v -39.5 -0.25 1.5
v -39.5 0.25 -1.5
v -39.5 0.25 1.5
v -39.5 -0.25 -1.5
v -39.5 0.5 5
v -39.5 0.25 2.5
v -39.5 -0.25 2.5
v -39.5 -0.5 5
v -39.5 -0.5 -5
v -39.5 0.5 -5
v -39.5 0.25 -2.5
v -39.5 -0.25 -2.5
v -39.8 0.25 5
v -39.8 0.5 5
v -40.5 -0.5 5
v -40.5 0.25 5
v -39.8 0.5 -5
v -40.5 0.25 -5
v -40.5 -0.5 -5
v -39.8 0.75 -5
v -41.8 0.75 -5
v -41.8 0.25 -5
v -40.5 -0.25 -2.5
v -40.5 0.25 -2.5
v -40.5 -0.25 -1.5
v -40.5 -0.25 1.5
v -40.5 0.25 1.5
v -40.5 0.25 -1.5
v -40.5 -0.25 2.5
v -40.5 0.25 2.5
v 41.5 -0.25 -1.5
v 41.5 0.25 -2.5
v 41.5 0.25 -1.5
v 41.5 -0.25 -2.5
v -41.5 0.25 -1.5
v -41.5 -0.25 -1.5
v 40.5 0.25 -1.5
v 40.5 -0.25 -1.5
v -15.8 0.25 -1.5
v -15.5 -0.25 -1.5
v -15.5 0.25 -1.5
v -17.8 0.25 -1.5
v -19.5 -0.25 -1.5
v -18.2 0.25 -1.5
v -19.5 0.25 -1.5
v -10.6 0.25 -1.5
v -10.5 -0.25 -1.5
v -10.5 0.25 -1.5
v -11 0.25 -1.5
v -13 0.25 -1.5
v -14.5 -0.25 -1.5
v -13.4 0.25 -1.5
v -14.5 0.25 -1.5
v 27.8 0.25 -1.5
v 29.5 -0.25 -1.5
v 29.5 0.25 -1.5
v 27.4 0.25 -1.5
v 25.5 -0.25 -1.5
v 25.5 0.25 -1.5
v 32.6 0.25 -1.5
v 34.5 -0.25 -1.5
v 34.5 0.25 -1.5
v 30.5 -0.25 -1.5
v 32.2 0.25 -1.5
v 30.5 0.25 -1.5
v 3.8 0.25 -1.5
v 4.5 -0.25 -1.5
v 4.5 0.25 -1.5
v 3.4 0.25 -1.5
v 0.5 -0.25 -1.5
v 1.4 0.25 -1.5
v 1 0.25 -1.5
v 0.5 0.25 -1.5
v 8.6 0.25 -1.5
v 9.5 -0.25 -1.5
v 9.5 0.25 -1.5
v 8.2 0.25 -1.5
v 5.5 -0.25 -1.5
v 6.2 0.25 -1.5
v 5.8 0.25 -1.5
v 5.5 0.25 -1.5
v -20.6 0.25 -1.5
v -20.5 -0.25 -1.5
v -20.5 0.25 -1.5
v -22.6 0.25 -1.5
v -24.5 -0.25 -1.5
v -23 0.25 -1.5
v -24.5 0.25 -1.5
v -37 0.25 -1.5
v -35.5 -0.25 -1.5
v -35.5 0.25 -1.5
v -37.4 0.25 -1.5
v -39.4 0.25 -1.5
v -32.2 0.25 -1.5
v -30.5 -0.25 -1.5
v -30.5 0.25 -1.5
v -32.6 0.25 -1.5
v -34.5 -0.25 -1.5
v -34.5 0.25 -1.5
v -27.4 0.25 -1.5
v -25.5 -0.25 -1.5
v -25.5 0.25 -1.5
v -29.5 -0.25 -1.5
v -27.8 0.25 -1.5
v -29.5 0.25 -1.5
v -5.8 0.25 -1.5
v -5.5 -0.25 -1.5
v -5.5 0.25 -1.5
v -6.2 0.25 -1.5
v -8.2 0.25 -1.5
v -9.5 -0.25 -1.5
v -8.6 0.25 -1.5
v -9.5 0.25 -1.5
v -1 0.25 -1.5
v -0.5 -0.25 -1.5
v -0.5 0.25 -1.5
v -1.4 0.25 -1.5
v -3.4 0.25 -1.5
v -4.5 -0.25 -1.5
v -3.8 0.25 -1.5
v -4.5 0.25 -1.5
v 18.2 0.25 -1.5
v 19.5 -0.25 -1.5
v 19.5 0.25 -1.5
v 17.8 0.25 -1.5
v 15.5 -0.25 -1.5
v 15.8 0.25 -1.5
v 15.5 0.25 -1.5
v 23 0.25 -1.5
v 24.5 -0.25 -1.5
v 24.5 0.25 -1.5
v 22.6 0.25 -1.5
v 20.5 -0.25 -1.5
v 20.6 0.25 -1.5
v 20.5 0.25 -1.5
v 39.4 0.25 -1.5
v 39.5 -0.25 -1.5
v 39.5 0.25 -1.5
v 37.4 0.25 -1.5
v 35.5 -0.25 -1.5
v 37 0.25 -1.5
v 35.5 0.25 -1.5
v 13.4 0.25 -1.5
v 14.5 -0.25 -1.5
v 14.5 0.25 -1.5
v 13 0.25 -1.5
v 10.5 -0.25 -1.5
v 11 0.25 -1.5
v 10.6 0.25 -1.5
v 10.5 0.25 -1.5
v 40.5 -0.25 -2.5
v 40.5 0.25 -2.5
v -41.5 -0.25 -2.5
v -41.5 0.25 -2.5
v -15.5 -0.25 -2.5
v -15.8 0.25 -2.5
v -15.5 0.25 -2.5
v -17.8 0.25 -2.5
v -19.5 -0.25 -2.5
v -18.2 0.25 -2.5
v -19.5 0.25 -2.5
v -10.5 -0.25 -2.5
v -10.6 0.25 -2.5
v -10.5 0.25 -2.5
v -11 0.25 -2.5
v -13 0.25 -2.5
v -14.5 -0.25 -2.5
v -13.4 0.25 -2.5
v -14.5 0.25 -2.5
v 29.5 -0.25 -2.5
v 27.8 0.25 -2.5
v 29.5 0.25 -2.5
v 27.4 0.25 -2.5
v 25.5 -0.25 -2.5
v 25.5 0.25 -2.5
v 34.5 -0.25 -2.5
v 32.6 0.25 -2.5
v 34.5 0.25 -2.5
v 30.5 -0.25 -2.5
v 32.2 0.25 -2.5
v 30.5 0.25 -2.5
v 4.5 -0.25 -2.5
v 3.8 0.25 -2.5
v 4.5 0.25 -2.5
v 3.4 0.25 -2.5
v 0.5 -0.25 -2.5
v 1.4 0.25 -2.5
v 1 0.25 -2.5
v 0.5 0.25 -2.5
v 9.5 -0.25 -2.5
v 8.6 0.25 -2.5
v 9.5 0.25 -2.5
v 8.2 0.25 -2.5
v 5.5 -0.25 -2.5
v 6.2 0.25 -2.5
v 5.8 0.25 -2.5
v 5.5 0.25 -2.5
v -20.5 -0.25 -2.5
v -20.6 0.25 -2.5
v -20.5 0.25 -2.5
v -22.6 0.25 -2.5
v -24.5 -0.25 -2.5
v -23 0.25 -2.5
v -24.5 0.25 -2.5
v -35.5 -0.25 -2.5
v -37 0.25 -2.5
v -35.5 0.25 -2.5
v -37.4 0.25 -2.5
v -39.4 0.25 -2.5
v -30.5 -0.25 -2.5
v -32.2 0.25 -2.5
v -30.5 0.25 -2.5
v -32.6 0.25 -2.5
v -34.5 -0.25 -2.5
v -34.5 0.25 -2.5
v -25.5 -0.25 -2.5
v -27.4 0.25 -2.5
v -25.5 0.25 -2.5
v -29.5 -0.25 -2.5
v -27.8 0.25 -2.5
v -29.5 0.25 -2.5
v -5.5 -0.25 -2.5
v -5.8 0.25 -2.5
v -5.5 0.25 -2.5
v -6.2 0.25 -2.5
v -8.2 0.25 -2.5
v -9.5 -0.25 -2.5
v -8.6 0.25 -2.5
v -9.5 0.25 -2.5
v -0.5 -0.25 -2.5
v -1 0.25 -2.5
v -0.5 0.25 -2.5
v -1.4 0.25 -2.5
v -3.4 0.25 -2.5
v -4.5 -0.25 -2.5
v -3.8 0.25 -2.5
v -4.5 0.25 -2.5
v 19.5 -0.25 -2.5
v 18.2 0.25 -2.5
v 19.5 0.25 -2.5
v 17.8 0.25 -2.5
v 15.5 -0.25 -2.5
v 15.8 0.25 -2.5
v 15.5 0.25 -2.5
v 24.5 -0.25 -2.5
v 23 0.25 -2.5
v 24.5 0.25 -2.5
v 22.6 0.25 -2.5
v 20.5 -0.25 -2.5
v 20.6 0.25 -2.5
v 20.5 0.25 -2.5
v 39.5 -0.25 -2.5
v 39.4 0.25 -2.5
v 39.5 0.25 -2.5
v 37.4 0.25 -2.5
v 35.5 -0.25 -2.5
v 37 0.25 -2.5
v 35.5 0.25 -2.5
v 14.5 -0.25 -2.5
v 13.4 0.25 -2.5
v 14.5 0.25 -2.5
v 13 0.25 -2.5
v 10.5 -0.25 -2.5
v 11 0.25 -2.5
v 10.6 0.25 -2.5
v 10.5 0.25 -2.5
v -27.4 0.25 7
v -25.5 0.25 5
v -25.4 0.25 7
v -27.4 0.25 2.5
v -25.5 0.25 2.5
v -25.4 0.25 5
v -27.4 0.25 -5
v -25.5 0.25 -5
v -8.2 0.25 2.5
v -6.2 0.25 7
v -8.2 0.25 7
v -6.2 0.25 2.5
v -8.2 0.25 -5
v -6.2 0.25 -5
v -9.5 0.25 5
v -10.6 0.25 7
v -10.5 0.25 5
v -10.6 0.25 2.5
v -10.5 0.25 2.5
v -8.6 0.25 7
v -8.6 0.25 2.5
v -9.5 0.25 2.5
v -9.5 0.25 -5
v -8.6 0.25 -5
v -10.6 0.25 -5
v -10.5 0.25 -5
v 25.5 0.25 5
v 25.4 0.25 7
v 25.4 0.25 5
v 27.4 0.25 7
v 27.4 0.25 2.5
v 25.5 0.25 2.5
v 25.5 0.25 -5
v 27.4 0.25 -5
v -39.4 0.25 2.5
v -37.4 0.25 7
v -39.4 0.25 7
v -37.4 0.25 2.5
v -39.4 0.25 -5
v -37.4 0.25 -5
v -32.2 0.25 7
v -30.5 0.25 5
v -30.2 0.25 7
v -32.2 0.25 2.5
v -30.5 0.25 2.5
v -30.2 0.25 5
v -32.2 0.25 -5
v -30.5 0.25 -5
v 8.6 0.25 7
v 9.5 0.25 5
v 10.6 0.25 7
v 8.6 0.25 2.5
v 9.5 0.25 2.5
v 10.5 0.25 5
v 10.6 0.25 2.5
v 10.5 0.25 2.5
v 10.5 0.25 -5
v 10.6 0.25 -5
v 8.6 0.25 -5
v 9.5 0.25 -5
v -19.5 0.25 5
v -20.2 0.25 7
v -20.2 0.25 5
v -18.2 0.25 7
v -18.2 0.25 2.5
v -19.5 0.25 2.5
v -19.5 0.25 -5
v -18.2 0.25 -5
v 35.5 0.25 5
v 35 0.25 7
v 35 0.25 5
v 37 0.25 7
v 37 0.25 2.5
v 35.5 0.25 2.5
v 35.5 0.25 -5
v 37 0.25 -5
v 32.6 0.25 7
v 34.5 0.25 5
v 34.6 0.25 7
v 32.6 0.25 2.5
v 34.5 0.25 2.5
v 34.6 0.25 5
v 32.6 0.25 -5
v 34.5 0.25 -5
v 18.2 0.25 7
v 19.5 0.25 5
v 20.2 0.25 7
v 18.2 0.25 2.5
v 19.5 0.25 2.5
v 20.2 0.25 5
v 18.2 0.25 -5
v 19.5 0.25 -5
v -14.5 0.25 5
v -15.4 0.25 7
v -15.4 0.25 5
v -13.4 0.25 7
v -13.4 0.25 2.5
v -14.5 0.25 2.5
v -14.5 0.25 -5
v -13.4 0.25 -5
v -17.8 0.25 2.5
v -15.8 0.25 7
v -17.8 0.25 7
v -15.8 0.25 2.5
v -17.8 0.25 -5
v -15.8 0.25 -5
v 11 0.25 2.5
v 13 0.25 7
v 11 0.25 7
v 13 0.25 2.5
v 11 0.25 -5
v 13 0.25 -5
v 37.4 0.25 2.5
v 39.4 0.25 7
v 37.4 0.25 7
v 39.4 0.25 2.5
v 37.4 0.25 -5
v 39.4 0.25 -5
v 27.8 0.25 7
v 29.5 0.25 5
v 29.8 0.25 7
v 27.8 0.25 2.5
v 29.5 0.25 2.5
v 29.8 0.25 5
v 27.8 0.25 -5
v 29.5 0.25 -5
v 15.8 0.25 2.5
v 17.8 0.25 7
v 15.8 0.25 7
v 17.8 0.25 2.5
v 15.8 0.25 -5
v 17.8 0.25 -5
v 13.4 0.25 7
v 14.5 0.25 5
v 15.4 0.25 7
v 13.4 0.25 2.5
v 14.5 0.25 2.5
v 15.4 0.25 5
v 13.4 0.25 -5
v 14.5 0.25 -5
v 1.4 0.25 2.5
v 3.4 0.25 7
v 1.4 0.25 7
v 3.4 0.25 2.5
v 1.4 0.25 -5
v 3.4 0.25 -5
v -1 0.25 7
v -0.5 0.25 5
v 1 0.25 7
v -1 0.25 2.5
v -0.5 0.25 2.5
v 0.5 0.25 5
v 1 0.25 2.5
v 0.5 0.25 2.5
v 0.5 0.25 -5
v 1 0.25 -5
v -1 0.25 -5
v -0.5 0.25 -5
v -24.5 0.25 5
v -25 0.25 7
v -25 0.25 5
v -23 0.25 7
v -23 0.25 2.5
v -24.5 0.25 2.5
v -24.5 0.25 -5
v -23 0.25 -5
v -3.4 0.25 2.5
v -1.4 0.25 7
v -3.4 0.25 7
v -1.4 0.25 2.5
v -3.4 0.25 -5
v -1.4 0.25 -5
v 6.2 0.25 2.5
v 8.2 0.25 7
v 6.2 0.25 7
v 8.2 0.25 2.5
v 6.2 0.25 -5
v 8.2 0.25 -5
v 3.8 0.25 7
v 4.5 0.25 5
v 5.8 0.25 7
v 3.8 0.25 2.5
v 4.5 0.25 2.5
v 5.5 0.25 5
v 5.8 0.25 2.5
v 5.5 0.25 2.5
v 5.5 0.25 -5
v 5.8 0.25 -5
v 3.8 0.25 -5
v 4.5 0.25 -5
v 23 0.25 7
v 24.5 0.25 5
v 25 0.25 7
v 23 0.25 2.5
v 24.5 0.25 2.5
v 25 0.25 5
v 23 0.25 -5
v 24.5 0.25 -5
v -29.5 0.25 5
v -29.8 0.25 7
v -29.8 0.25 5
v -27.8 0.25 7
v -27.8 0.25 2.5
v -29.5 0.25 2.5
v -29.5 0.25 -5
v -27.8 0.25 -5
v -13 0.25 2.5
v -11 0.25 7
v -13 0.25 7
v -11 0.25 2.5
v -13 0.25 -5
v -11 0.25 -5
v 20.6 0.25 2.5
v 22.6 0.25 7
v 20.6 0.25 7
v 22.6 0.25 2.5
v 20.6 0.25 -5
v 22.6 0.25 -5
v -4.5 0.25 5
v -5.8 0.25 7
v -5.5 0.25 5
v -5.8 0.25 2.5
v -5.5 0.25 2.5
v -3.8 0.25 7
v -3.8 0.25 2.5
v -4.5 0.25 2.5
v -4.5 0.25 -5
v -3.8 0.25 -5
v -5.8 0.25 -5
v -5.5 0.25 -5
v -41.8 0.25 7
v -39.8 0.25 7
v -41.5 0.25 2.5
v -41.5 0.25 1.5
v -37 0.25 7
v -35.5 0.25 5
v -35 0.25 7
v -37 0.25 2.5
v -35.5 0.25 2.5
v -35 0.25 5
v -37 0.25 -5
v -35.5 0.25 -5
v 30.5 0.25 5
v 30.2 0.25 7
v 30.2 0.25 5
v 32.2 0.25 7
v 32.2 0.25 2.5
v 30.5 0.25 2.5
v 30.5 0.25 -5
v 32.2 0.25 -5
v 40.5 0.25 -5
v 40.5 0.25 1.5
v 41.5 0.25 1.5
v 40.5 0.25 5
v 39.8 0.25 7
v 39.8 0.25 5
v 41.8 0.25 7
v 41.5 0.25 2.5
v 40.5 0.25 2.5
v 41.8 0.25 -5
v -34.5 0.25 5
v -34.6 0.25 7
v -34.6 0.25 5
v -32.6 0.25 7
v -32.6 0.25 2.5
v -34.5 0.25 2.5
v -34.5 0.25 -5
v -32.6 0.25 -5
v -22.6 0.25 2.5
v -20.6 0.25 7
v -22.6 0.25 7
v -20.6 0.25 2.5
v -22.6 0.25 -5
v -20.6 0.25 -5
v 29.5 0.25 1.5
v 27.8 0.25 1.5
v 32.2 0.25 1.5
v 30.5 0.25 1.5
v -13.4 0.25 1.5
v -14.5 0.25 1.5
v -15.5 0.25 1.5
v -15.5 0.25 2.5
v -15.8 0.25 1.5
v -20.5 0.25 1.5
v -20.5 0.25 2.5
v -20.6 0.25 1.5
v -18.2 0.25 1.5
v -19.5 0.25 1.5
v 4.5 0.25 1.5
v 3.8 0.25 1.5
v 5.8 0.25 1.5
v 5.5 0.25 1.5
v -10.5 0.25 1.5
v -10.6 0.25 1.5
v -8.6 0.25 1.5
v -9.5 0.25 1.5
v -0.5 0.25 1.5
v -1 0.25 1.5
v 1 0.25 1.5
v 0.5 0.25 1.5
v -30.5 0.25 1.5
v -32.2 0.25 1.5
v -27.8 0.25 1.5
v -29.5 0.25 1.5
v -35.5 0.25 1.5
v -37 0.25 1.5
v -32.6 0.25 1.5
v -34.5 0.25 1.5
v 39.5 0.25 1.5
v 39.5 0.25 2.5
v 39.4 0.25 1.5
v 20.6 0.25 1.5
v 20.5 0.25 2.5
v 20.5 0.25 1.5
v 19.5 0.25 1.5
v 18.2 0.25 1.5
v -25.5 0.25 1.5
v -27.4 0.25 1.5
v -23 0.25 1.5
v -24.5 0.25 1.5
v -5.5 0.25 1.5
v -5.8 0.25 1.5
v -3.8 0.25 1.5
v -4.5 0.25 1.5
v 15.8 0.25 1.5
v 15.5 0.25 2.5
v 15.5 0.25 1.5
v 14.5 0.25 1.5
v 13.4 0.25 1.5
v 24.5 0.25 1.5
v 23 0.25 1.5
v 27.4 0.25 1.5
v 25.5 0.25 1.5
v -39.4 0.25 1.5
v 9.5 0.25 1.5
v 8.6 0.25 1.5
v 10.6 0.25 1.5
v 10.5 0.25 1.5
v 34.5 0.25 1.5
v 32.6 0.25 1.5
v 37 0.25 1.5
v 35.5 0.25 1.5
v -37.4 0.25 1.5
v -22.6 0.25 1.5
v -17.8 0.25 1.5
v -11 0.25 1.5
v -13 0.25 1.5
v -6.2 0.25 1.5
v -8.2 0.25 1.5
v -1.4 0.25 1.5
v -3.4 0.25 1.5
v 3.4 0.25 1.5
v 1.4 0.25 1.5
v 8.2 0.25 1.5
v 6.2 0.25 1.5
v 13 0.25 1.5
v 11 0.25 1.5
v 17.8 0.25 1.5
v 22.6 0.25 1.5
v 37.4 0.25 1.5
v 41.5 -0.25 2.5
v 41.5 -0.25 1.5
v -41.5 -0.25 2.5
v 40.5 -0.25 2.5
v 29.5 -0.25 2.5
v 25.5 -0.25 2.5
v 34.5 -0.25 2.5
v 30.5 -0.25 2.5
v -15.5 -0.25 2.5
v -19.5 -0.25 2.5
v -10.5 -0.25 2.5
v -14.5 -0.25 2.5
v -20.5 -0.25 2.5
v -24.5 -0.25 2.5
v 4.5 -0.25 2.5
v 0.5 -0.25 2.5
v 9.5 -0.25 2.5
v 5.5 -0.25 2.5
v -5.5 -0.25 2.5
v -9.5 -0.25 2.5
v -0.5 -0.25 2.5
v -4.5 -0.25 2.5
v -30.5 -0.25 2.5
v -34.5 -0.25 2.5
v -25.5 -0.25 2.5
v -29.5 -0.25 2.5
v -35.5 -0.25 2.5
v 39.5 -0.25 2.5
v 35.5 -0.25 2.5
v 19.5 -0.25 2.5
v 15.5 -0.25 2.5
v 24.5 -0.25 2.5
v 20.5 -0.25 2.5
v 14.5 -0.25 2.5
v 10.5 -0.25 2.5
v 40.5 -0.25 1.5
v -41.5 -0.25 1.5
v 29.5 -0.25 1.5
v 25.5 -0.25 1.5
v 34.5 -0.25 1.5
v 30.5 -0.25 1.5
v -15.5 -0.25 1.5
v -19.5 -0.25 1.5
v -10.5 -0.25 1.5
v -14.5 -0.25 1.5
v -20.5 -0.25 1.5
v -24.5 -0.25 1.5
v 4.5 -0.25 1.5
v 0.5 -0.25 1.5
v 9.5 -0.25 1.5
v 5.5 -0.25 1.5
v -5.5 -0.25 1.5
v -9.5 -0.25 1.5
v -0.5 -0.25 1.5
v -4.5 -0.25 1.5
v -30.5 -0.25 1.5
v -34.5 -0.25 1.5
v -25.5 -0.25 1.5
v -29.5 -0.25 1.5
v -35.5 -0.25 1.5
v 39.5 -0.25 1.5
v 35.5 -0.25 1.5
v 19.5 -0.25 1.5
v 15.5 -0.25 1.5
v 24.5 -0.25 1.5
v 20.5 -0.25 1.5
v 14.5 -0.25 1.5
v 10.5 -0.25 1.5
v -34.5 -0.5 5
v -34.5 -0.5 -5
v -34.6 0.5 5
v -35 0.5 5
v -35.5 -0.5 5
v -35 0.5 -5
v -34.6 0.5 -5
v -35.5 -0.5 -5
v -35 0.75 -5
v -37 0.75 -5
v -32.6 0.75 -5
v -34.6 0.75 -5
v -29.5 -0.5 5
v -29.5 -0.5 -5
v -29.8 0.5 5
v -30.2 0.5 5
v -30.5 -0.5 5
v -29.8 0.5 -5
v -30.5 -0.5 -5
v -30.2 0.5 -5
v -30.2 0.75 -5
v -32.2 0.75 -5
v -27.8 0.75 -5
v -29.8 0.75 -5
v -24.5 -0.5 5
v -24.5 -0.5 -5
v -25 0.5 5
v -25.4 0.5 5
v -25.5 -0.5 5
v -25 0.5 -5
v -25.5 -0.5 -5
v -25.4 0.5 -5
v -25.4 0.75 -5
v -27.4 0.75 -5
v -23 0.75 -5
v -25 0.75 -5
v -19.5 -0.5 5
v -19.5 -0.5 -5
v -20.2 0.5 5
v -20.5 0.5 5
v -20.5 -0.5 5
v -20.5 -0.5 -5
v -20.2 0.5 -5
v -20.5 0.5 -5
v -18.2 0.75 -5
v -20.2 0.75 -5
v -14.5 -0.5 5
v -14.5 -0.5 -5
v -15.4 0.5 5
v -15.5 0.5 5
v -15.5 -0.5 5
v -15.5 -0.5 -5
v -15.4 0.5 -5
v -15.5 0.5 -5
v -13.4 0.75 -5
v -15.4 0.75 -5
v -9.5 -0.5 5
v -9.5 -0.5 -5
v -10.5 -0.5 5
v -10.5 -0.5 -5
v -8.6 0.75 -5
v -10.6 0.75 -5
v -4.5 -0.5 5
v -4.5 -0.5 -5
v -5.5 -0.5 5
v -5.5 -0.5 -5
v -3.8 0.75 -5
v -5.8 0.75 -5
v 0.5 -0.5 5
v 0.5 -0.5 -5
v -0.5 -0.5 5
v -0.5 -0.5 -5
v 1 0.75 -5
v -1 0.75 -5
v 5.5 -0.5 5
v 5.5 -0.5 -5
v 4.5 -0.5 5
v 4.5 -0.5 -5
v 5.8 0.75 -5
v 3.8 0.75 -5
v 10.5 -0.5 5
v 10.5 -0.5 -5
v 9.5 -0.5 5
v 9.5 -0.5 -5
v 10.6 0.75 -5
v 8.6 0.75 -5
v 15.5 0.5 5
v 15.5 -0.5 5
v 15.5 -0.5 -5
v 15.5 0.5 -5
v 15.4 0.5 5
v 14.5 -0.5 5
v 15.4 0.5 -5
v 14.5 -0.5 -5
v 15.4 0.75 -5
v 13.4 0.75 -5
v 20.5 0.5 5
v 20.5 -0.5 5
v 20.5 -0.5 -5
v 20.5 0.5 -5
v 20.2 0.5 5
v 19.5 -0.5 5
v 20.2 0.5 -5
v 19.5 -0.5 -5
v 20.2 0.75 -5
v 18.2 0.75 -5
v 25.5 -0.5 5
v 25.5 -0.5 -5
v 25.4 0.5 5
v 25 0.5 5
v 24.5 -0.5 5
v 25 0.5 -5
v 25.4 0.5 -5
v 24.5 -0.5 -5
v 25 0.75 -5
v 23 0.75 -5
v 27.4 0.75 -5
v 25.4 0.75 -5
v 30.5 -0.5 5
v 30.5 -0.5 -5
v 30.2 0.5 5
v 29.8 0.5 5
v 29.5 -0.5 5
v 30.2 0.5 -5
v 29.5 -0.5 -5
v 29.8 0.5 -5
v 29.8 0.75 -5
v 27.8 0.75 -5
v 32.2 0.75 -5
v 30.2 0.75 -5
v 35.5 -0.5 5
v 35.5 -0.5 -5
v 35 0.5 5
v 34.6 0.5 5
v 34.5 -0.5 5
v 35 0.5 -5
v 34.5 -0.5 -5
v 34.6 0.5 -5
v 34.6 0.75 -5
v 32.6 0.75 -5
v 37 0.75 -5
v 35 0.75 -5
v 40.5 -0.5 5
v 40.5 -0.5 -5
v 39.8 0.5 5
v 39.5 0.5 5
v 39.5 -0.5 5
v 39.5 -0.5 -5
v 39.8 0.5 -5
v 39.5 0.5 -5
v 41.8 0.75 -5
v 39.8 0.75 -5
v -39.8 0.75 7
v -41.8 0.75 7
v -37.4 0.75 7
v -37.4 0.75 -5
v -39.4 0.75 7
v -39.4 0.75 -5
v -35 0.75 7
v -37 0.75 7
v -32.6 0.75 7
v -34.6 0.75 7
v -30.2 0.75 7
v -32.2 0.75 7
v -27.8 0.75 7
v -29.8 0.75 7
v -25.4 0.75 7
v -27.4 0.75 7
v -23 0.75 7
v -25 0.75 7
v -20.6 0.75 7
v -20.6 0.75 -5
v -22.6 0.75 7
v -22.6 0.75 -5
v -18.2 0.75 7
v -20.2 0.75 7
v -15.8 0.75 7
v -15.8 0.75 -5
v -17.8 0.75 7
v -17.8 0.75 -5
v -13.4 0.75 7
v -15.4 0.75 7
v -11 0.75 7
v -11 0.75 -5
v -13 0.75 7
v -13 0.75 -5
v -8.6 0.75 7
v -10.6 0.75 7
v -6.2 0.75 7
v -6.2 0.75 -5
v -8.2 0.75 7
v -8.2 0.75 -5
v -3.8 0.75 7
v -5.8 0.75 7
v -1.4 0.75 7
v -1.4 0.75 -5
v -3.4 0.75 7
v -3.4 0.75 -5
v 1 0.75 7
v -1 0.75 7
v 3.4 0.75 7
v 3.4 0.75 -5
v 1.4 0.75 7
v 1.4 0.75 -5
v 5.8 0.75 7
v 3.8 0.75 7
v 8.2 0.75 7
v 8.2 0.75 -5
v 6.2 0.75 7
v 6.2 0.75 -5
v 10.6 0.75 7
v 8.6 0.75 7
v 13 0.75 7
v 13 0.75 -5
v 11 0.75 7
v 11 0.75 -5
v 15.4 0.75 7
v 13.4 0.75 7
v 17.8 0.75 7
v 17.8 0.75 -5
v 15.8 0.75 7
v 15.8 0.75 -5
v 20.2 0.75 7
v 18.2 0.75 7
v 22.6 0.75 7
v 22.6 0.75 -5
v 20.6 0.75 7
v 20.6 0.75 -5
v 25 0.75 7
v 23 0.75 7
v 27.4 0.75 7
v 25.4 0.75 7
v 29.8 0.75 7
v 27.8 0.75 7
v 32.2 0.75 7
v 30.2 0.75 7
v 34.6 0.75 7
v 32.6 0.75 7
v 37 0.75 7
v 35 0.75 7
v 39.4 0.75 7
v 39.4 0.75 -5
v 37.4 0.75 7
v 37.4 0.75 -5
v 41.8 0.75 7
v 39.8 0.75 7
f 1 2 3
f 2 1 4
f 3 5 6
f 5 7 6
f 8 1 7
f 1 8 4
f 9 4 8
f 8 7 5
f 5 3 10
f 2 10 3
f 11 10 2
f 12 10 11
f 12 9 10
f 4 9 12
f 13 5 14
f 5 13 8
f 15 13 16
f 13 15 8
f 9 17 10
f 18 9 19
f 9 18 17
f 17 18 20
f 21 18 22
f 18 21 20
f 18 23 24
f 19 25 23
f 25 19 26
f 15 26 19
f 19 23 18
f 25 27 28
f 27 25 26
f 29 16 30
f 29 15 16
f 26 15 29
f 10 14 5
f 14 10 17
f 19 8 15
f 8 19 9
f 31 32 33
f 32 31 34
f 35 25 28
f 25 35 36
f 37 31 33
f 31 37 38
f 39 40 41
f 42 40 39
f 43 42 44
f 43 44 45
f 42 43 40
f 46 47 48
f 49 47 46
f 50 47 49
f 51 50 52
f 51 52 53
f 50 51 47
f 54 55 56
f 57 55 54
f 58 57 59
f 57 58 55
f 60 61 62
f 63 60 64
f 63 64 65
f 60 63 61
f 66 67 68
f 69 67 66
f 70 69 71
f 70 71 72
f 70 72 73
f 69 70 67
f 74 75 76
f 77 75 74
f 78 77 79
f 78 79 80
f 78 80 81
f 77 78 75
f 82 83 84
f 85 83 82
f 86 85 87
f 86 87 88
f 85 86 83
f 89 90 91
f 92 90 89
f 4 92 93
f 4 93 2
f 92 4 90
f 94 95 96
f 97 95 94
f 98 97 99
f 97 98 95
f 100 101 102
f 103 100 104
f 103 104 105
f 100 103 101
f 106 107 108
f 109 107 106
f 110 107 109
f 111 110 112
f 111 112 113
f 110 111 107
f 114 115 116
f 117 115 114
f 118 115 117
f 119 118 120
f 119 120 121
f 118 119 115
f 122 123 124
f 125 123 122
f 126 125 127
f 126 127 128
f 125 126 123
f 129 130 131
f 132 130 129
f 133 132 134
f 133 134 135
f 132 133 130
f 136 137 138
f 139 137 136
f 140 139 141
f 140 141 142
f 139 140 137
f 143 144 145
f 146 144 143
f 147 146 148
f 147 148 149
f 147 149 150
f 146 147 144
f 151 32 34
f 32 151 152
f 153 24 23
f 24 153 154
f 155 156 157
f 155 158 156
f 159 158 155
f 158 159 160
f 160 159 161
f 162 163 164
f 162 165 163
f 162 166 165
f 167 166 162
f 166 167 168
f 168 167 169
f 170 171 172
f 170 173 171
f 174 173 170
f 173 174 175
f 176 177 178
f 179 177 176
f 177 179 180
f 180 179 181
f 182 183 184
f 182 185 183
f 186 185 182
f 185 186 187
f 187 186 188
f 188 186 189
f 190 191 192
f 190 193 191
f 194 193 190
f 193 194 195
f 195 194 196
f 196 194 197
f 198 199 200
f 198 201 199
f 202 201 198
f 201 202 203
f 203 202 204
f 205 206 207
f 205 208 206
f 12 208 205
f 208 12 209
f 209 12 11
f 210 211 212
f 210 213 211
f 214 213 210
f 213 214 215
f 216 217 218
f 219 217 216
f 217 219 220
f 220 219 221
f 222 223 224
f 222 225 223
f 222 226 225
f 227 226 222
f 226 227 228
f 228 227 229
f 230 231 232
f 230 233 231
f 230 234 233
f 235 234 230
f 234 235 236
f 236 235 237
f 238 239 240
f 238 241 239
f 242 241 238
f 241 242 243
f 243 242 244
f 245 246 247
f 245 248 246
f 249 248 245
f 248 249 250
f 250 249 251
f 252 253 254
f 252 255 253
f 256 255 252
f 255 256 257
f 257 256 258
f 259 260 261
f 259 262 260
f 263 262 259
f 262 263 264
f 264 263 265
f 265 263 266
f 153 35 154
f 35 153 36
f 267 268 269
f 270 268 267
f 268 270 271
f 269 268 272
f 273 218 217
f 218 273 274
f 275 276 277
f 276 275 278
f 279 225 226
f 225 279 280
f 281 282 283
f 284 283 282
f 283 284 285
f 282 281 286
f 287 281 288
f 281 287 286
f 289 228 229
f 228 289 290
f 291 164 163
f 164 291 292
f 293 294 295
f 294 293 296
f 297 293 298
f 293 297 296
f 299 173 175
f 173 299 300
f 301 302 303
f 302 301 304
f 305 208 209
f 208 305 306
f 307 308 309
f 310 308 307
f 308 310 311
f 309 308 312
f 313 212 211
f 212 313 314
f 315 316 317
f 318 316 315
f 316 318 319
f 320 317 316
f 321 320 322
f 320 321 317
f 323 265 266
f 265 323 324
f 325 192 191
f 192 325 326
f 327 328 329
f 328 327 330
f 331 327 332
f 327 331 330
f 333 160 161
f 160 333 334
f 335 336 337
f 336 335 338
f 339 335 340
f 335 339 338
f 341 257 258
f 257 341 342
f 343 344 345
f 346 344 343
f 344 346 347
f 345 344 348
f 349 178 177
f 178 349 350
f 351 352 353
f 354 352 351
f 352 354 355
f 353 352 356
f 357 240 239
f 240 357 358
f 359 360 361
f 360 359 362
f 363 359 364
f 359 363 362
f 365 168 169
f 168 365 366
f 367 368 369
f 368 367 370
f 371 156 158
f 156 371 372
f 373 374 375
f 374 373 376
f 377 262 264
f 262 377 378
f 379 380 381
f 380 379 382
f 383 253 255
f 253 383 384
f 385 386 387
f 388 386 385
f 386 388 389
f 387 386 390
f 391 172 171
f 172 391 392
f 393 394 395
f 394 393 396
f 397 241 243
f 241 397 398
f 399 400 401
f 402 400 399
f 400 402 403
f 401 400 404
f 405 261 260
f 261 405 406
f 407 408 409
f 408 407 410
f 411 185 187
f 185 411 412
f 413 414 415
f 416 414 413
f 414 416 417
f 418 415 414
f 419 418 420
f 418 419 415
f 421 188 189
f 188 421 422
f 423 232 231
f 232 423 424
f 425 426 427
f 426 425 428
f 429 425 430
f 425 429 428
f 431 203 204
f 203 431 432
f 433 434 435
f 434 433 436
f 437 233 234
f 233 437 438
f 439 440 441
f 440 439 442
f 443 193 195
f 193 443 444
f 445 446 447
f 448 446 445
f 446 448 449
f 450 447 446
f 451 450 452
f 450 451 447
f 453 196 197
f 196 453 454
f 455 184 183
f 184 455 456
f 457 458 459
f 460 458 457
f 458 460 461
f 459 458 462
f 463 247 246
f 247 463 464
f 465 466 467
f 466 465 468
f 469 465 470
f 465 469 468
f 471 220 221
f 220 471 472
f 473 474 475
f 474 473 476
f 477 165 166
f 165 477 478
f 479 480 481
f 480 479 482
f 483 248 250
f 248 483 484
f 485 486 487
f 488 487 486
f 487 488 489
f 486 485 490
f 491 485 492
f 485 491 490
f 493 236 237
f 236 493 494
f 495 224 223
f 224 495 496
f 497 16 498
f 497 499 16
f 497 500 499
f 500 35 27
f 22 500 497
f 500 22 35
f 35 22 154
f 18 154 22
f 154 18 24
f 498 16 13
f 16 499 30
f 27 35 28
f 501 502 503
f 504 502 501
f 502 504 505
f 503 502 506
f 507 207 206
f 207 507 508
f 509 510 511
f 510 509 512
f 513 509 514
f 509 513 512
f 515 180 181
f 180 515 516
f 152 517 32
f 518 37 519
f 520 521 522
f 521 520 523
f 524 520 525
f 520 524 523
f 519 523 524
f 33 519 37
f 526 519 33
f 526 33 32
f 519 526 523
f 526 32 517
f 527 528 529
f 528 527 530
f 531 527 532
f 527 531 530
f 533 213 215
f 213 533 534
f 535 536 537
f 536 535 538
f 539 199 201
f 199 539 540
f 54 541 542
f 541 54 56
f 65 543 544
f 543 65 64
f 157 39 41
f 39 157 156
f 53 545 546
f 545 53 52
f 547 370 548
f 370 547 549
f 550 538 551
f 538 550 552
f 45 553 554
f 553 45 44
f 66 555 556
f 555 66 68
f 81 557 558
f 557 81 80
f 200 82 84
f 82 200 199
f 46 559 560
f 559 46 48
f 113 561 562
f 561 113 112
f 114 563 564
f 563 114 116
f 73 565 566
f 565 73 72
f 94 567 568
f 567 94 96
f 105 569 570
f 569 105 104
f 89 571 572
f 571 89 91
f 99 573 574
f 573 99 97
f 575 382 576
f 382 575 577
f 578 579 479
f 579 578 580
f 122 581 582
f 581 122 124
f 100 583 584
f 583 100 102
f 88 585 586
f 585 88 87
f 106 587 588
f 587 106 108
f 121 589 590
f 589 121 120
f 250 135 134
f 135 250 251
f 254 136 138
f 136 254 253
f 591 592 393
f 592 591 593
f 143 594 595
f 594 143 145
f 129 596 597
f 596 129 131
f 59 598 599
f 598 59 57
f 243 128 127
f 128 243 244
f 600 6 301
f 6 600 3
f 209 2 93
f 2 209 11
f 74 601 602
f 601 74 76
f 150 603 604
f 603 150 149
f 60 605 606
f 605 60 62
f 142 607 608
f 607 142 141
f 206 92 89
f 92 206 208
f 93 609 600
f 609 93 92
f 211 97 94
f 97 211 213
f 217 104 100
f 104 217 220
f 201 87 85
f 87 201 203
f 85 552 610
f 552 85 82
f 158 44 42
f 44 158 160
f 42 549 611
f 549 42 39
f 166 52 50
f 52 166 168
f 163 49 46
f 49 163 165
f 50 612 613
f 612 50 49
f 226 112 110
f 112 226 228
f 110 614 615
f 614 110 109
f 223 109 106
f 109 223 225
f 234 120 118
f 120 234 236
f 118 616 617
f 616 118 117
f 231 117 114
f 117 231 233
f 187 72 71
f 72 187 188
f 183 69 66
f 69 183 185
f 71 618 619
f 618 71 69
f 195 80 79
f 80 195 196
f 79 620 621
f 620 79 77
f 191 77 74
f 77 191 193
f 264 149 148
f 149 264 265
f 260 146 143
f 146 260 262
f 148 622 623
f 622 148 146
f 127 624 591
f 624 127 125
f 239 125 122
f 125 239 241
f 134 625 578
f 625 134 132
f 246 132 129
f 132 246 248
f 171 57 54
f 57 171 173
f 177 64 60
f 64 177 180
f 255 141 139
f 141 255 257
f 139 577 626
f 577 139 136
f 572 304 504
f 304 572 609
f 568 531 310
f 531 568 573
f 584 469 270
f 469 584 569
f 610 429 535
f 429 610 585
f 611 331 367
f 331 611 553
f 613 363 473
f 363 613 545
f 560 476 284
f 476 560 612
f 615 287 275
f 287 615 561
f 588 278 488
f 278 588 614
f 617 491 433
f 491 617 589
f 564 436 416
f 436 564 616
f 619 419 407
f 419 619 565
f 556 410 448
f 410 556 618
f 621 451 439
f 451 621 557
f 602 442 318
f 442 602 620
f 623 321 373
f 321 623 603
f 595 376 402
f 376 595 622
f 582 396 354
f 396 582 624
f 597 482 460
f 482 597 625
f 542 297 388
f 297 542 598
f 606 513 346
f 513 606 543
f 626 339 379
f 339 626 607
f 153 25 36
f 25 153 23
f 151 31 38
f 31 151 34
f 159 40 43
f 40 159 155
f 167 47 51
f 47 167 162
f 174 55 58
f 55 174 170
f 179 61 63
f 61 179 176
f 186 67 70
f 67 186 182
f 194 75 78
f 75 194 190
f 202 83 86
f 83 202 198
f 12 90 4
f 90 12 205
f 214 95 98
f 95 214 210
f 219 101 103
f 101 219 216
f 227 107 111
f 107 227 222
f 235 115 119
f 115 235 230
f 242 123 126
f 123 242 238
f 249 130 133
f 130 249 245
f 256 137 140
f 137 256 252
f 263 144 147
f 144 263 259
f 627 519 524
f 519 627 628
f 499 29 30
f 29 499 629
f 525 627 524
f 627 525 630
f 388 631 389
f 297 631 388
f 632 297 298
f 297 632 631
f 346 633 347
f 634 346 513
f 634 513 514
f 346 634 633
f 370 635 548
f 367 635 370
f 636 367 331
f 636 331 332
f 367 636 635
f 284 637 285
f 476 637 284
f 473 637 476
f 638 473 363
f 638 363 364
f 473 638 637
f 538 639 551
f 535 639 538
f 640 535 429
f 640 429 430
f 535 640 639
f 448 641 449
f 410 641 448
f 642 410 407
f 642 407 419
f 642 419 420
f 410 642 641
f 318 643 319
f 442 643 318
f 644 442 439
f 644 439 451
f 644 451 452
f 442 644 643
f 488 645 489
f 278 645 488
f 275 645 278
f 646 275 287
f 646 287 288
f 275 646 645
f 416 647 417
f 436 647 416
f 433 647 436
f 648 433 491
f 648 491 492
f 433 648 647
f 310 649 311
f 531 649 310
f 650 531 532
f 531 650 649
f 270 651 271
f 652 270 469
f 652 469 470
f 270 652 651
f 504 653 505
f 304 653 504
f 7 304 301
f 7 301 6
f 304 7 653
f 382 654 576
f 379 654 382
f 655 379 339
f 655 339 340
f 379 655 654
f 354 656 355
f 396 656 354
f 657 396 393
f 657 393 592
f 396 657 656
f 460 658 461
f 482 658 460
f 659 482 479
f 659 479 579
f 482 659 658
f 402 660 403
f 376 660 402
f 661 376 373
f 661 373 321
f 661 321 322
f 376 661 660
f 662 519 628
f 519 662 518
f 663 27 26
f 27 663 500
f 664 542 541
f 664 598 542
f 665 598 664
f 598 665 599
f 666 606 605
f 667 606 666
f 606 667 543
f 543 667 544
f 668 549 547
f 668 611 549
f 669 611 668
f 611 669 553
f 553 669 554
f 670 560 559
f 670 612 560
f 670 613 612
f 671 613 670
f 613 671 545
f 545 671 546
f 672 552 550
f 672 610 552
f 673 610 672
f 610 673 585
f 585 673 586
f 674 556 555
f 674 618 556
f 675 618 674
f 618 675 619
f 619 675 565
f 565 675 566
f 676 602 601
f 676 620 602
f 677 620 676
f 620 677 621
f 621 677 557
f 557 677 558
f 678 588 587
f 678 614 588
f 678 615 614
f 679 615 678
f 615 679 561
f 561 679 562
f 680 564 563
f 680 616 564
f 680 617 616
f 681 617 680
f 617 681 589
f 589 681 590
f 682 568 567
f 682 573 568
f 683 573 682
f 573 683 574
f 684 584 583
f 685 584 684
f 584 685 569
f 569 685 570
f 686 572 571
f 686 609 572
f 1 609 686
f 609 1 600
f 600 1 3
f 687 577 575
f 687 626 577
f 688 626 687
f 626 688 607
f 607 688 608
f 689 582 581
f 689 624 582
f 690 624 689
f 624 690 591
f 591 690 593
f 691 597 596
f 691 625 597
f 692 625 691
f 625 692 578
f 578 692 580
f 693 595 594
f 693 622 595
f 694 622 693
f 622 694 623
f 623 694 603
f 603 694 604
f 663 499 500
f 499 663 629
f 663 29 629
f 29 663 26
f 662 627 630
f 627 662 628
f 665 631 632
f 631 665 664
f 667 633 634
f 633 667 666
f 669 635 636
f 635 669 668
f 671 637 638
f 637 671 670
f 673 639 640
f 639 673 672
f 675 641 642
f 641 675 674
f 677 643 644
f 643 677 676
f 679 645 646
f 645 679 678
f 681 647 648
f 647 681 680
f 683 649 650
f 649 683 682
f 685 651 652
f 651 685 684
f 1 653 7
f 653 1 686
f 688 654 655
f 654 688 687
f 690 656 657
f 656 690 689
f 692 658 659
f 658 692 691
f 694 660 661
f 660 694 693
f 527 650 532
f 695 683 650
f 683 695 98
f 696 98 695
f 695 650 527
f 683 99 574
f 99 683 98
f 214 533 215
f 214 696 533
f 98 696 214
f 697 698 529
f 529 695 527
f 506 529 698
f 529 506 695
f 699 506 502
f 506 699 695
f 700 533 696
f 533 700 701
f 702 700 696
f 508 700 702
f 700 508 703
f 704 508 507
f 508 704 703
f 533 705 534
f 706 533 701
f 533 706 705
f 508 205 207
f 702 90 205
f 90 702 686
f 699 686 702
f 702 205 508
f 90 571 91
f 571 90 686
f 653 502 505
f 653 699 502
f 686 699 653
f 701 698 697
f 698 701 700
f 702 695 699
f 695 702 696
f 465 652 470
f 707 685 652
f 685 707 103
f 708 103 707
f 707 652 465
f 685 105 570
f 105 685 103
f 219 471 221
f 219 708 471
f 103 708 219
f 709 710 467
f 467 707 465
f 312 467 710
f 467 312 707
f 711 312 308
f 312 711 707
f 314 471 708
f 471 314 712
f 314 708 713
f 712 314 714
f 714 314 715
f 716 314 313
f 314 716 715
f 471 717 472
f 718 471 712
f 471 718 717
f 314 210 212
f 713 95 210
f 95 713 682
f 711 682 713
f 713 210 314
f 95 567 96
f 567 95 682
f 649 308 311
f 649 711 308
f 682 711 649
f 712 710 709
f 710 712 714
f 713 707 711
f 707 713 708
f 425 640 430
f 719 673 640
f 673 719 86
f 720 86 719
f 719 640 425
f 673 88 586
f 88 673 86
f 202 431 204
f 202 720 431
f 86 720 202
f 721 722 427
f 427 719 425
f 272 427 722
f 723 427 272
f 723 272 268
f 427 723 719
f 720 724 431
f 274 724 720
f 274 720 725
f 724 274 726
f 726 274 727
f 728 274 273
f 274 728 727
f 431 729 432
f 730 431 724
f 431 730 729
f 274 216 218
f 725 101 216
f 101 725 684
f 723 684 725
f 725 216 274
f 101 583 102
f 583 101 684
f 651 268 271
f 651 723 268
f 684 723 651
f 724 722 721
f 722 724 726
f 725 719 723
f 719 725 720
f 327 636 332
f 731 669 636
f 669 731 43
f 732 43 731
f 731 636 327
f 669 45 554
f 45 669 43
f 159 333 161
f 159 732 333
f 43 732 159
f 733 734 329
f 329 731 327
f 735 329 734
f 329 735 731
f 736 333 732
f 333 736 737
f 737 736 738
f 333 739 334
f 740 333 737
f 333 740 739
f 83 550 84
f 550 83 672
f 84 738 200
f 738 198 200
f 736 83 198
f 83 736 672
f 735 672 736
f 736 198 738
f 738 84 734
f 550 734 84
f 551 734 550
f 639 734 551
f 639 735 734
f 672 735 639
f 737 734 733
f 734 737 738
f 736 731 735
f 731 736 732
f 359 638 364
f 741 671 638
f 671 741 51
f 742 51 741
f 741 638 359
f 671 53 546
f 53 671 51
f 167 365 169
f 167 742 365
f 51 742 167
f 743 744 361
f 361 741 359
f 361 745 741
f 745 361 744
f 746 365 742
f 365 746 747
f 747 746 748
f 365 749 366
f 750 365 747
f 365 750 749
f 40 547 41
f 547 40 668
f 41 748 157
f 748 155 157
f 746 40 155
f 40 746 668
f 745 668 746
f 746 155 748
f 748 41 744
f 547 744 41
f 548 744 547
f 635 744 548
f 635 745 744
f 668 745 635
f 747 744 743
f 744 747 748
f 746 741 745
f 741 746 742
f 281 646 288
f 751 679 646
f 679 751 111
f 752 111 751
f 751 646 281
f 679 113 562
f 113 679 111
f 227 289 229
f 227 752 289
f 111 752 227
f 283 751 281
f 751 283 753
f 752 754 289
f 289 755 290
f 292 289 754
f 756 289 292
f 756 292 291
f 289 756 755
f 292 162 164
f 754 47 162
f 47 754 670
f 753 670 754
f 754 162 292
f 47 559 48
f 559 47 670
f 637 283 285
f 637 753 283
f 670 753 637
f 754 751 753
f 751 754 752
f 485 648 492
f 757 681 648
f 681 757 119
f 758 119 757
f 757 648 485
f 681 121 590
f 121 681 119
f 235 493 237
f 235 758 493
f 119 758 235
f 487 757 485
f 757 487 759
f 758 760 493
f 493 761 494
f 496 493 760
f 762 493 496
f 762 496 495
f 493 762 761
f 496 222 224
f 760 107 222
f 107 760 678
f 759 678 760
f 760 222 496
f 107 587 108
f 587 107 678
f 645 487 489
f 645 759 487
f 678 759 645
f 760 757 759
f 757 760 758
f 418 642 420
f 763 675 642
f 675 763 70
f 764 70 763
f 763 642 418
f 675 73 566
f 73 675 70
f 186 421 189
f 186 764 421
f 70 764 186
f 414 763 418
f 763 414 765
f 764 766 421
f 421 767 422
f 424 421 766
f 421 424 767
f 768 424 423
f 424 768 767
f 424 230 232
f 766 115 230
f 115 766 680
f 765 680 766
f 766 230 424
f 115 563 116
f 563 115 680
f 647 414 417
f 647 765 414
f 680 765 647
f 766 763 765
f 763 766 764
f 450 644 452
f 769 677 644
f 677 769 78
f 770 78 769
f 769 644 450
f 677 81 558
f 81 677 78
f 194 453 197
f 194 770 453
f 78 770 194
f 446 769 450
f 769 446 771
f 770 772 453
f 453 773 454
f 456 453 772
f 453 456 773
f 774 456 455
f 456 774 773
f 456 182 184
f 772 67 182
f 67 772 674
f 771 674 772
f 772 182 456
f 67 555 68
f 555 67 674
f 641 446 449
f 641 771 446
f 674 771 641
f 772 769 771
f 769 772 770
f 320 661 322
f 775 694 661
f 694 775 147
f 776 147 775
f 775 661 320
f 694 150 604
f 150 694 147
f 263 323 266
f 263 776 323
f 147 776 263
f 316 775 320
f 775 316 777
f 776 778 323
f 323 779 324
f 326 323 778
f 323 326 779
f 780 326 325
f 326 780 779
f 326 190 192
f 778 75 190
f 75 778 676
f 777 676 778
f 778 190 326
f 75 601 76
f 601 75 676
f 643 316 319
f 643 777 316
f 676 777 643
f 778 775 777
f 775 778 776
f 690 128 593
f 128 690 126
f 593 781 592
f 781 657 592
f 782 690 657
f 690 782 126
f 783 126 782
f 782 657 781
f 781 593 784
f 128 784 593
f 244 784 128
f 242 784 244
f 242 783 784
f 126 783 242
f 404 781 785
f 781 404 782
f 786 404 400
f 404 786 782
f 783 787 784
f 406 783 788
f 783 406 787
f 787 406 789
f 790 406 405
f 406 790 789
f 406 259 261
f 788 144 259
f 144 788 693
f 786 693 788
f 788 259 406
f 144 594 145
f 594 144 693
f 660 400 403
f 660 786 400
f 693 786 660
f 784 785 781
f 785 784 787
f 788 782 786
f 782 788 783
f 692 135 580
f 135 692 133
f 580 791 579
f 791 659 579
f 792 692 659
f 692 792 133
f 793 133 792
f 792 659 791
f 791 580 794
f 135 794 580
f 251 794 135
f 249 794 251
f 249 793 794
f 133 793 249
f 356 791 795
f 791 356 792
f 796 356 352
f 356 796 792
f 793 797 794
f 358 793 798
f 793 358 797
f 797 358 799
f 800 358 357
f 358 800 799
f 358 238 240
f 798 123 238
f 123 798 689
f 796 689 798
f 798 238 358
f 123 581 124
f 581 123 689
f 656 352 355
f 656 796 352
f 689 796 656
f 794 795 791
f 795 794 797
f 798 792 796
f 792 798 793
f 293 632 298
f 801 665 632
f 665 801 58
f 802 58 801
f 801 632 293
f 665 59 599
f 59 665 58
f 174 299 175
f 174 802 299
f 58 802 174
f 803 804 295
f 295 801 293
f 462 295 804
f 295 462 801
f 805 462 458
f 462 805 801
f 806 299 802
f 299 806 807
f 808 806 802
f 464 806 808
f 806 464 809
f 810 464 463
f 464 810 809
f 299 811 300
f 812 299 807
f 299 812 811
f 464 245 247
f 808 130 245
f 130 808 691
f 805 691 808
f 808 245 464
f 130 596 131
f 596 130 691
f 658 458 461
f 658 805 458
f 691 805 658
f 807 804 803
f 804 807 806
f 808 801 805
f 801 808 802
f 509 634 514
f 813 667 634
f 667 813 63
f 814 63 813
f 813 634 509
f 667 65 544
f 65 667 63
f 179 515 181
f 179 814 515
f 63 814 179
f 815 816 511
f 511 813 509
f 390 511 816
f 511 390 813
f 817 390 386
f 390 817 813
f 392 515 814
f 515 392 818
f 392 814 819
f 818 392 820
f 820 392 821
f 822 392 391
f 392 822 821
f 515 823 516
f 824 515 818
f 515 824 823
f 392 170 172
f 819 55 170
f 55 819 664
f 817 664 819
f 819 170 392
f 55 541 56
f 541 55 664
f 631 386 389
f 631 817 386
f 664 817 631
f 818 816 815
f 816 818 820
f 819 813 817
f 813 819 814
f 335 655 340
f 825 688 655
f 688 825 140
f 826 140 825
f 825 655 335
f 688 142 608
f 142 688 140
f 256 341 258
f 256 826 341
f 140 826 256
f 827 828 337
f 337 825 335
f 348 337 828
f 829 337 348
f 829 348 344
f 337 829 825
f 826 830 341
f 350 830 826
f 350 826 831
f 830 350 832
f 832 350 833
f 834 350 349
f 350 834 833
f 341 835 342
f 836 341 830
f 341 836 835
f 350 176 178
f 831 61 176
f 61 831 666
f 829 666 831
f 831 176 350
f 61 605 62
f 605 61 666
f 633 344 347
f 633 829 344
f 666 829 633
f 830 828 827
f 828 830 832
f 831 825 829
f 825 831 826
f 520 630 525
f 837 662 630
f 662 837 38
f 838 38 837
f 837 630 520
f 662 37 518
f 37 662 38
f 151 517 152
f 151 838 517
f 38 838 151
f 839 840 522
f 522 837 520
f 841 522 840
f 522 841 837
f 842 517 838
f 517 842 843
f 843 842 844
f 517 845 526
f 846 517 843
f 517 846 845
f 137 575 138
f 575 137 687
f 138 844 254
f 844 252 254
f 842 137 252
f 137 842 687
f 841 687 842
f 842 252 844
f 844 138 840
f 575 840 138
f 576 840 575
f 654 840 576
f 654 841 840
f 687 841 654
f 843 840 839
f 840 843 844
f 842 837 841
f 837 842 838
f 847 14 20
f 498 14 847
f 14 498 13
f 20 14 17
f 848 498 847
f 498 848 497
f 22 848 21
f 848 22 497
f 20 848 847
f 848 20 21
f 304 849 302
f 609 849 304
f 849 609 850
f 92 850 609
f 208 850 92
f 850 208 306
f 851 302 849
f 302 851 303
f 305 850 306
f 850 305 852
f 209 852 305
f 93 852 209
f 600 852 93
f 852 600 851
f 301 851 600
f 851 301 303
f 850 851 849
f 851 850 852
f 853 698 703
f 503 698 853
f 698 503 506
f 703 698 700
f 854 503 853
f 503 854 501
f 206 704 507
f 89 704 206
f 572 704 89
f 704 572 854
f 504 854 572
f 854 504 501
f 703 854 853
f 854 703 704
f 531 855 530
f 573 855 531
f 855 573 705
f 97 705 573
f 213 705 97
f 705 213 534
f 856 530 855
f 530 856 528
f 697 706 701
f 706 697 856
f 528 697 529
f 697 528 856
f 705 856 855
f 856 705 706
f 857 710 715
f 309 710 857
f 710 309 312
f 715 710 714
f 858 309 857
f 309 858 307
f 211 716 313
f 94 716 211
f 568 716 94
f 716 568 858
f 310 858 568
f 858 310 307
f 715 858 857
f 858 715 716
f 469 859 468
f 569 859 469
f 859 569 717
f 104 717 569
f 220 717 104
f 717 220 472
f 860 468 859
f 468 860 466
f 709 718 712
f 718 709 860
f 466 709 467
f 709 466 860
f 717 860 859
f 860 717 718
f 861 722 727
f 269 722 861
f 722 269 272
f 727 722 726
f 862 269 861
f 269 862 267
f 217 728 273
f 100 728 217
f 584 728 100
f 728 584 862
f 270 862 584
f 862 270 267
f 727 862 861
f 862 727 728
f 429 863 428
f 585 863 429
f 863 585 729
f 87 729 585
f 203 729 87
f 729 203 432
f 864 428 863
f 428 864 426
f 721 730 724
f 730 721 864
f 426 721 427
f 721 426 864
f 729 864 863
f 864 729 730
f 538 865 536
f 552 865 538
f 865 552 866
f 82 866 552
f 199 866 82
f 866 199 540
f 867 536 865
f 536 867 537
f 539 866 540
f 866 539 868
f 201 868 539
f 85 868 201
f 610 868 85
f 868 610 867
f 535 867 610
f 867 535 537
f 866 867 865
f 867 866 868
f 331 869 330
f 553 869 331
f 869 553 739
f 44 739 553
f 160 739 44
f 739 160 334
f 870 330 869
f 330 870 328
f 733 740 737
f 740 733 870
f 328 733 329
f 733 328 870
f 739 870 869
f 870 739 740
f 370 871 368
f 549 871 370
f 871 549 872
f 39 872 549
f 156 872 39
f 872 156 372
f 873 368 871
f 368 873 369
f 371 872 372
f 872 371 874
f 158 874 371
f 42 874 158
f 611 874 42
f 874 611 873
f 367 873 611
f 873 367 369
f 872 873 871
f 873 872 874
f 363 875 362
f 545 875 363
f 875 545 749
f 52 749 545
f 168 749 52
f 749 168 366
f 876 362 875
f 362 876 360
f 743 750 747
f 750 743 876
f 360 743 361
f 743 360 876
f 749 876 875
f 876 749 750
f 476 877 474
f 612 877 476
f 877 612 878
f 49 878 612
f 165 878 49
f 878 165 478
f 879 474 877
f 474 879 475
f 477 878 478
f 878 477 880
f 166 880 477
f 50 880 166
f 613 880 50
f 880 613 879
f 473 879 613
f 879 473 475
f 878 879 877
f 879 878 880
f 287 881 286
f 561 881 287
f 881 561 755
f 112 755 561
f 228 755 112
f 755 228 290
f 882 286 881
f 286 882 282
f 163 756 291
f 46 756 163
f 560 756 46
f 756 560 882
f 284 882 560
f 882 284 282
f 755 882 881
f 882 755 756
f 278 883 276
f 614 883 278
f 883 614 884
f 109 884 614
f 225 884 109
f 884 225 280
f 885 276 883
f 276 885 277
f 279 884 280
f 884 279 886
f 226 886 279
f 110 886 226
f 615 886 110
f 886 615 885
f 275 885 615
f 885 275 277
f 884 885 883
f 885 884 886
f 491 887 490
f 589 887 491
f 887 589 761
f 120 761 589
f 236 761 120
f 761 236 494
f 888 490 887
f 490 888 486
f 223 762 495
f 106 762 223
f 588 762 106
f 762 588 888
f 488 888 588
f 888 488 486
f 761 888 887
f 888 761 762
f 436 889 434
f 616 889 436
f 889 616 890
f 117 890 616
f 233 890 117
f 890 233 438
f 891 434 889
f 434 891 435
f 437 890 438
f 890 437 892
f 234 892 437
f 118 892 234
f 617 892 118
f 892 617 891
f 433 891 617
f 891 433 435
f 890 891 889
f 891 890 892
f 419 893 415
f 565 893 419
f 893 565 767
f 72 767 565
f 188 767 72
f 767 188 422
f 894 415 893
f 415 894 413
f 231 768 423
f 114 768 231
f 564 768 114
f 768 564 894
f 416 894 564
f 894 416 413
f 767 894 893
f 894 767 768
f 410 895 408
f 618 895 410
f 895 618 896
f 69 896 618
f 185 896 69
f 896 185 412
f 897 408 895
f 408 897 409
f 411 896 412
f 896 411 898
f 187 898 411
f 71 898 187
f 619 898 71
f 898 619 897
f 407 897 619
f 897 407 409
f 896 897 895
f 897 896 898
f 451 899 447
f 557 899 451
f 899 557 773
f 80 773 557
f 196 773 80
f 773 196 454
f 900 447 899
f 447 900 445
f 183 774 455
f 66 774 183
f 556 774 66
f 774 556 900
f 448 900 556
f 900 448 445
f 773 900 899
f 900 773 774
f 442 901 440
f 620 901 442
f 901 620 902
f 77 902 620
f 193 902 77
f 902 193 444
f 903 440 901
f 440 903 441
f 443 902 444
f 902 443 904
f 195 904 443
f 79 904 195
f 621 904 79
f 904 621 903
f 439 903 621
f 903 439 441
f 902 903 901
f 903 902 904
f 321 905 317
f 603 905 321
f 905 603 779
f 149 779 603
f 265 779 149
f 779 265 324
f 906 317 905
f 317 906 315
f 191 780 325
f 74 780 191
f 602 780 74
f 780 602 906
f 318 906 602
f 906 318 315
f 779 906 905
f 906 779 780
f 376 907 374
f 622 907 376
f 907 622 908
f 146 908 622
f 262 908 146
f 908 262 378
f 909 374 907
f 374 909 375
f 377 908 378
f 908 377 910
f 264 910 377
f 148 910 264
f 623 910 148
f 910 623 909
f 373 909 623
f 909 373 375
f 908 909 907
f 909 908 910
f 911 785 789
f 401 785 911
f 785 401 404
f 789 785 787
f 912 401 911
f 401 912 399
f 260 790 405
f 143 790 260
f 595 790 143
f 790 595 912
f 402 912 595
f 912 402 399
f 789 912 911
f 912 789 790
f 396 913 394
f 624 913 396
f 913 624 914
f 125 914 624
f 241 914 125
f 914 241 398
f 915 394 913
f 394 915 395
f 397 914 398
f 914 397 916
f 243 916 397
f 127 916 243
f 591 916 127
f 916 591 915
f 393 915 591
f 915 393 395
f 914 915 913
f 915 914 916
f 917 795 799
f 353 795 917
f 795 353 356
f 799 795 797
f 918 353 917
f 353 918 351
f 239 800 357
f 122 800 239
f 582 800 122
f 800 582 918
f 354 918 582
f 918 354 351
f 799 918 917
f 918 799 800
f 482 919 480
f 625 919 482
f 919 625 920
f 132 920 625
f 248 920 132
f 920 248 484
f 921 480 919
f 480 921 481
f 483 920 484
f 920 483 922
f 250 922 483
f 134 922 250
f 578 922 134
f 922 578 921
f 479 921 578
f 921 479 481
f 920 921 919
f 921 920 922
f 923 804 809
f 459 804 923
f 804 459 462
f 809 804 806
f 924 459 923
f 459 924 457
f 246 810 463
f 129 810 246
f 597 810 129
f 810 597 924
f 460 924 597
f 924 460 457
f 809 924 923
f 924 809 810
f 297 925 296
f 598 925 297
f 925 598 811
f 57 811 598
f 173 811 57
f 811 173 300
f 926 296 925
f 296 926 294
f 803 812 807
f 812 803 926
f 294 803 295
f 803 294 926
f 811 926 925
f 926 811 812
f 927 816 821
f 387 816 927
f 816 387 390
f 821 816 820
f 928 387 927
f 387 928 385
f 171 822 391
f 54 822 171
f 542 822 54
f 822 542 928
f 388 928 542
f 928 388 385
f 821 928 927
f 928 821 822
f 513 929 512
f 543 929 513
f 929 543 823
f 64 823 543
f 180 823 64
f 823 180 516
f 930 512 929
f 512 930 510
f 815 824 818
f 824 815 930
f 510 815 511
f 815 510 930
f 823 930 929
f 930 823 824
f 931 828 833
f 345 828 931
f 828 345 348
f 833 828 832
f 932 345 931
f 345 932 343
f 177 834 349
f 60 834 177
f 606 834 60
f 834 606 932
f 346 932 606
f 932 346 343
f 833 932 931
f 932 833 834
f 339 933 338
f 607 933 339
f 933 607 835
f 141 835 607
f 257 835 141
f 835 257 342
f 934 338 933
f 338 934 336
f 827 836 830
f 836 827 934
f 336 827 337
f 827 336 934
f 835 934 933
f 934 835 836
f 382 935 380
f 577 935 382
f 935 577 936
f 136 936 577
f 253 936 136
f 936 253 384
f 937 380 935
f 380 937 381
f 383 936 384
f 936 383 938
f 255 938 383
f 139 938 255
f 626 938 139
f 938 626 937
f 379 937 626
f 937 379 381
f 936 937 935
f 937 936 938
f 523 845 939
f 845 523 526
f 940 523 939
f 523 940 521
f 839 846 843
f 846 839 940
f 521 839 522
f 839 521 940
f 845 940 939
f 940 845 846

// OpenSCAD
module Fence_02(){

    module staccionata(){
    color("#da6d42")
    cube([1,1,10],center = true);
    }

    for (i=[-8:8]){
        translate([i*5,0,0])
        staccionata();
          
        color("#da6d42"){     
        translate([0,0,-2])     
        cube([83,0.5,1],center = true);}

        color("#da6d42"){  
        translate([0,0,2])
        cube([83,0.5,1],center = true);
        }
    }
    
    color("#bd9476"){
    for (i=[-17:17])

       translate([i*2.4,0.5,1])
       cube([2,0.5,12],center = true);
    }
    
}

Fence_02();

// Written by Nicolì Angelo (Gengio) 2024: 
// MIT License

//Permission is hereby granted, free of charge, to any person obtaining a copy of this software and associated documentation files (the "Software"), to deal in the Software without restriction, including without limitation the rights to use, copy, modify, merge, publish, distribute, sublicense, and/or sell copies of the Software, and to permit persons to whom the Software is furnished to do so, subject to the following conditions:

//The above copyright notice and this permission notice shall be included in all copies or substantial portions of the Software.

//THE SOFTWARE IS PROVIDED "AS IS", WITHOUT WARRANTY OF ANY KIND, EXPRESS OR IMPLIED, INCLUDING BUT NOT LIMITED TO THE WARRANTIES OF MERCHANTABILITY, FITNESS FOR A PARTICULAR PURPOSE AND NONINFRINGEMENT. IN NO EVENT SHALL THE AUTHORS OR COPYRIGHT HOLDERS BE LIABLE FOR ANY CLAIM, DAMAGES OR OTHER LIABILITY, WHETHER IN AN ACTION OF CONTRACT, TORT OR OTHERWISE, ARISING FROM, OUT OF OR IN CONNECTION WITH THE SOFTWARE OR THE USE OR OTHER DEALINGS IN THE SOFTWARE.
 

          
         
